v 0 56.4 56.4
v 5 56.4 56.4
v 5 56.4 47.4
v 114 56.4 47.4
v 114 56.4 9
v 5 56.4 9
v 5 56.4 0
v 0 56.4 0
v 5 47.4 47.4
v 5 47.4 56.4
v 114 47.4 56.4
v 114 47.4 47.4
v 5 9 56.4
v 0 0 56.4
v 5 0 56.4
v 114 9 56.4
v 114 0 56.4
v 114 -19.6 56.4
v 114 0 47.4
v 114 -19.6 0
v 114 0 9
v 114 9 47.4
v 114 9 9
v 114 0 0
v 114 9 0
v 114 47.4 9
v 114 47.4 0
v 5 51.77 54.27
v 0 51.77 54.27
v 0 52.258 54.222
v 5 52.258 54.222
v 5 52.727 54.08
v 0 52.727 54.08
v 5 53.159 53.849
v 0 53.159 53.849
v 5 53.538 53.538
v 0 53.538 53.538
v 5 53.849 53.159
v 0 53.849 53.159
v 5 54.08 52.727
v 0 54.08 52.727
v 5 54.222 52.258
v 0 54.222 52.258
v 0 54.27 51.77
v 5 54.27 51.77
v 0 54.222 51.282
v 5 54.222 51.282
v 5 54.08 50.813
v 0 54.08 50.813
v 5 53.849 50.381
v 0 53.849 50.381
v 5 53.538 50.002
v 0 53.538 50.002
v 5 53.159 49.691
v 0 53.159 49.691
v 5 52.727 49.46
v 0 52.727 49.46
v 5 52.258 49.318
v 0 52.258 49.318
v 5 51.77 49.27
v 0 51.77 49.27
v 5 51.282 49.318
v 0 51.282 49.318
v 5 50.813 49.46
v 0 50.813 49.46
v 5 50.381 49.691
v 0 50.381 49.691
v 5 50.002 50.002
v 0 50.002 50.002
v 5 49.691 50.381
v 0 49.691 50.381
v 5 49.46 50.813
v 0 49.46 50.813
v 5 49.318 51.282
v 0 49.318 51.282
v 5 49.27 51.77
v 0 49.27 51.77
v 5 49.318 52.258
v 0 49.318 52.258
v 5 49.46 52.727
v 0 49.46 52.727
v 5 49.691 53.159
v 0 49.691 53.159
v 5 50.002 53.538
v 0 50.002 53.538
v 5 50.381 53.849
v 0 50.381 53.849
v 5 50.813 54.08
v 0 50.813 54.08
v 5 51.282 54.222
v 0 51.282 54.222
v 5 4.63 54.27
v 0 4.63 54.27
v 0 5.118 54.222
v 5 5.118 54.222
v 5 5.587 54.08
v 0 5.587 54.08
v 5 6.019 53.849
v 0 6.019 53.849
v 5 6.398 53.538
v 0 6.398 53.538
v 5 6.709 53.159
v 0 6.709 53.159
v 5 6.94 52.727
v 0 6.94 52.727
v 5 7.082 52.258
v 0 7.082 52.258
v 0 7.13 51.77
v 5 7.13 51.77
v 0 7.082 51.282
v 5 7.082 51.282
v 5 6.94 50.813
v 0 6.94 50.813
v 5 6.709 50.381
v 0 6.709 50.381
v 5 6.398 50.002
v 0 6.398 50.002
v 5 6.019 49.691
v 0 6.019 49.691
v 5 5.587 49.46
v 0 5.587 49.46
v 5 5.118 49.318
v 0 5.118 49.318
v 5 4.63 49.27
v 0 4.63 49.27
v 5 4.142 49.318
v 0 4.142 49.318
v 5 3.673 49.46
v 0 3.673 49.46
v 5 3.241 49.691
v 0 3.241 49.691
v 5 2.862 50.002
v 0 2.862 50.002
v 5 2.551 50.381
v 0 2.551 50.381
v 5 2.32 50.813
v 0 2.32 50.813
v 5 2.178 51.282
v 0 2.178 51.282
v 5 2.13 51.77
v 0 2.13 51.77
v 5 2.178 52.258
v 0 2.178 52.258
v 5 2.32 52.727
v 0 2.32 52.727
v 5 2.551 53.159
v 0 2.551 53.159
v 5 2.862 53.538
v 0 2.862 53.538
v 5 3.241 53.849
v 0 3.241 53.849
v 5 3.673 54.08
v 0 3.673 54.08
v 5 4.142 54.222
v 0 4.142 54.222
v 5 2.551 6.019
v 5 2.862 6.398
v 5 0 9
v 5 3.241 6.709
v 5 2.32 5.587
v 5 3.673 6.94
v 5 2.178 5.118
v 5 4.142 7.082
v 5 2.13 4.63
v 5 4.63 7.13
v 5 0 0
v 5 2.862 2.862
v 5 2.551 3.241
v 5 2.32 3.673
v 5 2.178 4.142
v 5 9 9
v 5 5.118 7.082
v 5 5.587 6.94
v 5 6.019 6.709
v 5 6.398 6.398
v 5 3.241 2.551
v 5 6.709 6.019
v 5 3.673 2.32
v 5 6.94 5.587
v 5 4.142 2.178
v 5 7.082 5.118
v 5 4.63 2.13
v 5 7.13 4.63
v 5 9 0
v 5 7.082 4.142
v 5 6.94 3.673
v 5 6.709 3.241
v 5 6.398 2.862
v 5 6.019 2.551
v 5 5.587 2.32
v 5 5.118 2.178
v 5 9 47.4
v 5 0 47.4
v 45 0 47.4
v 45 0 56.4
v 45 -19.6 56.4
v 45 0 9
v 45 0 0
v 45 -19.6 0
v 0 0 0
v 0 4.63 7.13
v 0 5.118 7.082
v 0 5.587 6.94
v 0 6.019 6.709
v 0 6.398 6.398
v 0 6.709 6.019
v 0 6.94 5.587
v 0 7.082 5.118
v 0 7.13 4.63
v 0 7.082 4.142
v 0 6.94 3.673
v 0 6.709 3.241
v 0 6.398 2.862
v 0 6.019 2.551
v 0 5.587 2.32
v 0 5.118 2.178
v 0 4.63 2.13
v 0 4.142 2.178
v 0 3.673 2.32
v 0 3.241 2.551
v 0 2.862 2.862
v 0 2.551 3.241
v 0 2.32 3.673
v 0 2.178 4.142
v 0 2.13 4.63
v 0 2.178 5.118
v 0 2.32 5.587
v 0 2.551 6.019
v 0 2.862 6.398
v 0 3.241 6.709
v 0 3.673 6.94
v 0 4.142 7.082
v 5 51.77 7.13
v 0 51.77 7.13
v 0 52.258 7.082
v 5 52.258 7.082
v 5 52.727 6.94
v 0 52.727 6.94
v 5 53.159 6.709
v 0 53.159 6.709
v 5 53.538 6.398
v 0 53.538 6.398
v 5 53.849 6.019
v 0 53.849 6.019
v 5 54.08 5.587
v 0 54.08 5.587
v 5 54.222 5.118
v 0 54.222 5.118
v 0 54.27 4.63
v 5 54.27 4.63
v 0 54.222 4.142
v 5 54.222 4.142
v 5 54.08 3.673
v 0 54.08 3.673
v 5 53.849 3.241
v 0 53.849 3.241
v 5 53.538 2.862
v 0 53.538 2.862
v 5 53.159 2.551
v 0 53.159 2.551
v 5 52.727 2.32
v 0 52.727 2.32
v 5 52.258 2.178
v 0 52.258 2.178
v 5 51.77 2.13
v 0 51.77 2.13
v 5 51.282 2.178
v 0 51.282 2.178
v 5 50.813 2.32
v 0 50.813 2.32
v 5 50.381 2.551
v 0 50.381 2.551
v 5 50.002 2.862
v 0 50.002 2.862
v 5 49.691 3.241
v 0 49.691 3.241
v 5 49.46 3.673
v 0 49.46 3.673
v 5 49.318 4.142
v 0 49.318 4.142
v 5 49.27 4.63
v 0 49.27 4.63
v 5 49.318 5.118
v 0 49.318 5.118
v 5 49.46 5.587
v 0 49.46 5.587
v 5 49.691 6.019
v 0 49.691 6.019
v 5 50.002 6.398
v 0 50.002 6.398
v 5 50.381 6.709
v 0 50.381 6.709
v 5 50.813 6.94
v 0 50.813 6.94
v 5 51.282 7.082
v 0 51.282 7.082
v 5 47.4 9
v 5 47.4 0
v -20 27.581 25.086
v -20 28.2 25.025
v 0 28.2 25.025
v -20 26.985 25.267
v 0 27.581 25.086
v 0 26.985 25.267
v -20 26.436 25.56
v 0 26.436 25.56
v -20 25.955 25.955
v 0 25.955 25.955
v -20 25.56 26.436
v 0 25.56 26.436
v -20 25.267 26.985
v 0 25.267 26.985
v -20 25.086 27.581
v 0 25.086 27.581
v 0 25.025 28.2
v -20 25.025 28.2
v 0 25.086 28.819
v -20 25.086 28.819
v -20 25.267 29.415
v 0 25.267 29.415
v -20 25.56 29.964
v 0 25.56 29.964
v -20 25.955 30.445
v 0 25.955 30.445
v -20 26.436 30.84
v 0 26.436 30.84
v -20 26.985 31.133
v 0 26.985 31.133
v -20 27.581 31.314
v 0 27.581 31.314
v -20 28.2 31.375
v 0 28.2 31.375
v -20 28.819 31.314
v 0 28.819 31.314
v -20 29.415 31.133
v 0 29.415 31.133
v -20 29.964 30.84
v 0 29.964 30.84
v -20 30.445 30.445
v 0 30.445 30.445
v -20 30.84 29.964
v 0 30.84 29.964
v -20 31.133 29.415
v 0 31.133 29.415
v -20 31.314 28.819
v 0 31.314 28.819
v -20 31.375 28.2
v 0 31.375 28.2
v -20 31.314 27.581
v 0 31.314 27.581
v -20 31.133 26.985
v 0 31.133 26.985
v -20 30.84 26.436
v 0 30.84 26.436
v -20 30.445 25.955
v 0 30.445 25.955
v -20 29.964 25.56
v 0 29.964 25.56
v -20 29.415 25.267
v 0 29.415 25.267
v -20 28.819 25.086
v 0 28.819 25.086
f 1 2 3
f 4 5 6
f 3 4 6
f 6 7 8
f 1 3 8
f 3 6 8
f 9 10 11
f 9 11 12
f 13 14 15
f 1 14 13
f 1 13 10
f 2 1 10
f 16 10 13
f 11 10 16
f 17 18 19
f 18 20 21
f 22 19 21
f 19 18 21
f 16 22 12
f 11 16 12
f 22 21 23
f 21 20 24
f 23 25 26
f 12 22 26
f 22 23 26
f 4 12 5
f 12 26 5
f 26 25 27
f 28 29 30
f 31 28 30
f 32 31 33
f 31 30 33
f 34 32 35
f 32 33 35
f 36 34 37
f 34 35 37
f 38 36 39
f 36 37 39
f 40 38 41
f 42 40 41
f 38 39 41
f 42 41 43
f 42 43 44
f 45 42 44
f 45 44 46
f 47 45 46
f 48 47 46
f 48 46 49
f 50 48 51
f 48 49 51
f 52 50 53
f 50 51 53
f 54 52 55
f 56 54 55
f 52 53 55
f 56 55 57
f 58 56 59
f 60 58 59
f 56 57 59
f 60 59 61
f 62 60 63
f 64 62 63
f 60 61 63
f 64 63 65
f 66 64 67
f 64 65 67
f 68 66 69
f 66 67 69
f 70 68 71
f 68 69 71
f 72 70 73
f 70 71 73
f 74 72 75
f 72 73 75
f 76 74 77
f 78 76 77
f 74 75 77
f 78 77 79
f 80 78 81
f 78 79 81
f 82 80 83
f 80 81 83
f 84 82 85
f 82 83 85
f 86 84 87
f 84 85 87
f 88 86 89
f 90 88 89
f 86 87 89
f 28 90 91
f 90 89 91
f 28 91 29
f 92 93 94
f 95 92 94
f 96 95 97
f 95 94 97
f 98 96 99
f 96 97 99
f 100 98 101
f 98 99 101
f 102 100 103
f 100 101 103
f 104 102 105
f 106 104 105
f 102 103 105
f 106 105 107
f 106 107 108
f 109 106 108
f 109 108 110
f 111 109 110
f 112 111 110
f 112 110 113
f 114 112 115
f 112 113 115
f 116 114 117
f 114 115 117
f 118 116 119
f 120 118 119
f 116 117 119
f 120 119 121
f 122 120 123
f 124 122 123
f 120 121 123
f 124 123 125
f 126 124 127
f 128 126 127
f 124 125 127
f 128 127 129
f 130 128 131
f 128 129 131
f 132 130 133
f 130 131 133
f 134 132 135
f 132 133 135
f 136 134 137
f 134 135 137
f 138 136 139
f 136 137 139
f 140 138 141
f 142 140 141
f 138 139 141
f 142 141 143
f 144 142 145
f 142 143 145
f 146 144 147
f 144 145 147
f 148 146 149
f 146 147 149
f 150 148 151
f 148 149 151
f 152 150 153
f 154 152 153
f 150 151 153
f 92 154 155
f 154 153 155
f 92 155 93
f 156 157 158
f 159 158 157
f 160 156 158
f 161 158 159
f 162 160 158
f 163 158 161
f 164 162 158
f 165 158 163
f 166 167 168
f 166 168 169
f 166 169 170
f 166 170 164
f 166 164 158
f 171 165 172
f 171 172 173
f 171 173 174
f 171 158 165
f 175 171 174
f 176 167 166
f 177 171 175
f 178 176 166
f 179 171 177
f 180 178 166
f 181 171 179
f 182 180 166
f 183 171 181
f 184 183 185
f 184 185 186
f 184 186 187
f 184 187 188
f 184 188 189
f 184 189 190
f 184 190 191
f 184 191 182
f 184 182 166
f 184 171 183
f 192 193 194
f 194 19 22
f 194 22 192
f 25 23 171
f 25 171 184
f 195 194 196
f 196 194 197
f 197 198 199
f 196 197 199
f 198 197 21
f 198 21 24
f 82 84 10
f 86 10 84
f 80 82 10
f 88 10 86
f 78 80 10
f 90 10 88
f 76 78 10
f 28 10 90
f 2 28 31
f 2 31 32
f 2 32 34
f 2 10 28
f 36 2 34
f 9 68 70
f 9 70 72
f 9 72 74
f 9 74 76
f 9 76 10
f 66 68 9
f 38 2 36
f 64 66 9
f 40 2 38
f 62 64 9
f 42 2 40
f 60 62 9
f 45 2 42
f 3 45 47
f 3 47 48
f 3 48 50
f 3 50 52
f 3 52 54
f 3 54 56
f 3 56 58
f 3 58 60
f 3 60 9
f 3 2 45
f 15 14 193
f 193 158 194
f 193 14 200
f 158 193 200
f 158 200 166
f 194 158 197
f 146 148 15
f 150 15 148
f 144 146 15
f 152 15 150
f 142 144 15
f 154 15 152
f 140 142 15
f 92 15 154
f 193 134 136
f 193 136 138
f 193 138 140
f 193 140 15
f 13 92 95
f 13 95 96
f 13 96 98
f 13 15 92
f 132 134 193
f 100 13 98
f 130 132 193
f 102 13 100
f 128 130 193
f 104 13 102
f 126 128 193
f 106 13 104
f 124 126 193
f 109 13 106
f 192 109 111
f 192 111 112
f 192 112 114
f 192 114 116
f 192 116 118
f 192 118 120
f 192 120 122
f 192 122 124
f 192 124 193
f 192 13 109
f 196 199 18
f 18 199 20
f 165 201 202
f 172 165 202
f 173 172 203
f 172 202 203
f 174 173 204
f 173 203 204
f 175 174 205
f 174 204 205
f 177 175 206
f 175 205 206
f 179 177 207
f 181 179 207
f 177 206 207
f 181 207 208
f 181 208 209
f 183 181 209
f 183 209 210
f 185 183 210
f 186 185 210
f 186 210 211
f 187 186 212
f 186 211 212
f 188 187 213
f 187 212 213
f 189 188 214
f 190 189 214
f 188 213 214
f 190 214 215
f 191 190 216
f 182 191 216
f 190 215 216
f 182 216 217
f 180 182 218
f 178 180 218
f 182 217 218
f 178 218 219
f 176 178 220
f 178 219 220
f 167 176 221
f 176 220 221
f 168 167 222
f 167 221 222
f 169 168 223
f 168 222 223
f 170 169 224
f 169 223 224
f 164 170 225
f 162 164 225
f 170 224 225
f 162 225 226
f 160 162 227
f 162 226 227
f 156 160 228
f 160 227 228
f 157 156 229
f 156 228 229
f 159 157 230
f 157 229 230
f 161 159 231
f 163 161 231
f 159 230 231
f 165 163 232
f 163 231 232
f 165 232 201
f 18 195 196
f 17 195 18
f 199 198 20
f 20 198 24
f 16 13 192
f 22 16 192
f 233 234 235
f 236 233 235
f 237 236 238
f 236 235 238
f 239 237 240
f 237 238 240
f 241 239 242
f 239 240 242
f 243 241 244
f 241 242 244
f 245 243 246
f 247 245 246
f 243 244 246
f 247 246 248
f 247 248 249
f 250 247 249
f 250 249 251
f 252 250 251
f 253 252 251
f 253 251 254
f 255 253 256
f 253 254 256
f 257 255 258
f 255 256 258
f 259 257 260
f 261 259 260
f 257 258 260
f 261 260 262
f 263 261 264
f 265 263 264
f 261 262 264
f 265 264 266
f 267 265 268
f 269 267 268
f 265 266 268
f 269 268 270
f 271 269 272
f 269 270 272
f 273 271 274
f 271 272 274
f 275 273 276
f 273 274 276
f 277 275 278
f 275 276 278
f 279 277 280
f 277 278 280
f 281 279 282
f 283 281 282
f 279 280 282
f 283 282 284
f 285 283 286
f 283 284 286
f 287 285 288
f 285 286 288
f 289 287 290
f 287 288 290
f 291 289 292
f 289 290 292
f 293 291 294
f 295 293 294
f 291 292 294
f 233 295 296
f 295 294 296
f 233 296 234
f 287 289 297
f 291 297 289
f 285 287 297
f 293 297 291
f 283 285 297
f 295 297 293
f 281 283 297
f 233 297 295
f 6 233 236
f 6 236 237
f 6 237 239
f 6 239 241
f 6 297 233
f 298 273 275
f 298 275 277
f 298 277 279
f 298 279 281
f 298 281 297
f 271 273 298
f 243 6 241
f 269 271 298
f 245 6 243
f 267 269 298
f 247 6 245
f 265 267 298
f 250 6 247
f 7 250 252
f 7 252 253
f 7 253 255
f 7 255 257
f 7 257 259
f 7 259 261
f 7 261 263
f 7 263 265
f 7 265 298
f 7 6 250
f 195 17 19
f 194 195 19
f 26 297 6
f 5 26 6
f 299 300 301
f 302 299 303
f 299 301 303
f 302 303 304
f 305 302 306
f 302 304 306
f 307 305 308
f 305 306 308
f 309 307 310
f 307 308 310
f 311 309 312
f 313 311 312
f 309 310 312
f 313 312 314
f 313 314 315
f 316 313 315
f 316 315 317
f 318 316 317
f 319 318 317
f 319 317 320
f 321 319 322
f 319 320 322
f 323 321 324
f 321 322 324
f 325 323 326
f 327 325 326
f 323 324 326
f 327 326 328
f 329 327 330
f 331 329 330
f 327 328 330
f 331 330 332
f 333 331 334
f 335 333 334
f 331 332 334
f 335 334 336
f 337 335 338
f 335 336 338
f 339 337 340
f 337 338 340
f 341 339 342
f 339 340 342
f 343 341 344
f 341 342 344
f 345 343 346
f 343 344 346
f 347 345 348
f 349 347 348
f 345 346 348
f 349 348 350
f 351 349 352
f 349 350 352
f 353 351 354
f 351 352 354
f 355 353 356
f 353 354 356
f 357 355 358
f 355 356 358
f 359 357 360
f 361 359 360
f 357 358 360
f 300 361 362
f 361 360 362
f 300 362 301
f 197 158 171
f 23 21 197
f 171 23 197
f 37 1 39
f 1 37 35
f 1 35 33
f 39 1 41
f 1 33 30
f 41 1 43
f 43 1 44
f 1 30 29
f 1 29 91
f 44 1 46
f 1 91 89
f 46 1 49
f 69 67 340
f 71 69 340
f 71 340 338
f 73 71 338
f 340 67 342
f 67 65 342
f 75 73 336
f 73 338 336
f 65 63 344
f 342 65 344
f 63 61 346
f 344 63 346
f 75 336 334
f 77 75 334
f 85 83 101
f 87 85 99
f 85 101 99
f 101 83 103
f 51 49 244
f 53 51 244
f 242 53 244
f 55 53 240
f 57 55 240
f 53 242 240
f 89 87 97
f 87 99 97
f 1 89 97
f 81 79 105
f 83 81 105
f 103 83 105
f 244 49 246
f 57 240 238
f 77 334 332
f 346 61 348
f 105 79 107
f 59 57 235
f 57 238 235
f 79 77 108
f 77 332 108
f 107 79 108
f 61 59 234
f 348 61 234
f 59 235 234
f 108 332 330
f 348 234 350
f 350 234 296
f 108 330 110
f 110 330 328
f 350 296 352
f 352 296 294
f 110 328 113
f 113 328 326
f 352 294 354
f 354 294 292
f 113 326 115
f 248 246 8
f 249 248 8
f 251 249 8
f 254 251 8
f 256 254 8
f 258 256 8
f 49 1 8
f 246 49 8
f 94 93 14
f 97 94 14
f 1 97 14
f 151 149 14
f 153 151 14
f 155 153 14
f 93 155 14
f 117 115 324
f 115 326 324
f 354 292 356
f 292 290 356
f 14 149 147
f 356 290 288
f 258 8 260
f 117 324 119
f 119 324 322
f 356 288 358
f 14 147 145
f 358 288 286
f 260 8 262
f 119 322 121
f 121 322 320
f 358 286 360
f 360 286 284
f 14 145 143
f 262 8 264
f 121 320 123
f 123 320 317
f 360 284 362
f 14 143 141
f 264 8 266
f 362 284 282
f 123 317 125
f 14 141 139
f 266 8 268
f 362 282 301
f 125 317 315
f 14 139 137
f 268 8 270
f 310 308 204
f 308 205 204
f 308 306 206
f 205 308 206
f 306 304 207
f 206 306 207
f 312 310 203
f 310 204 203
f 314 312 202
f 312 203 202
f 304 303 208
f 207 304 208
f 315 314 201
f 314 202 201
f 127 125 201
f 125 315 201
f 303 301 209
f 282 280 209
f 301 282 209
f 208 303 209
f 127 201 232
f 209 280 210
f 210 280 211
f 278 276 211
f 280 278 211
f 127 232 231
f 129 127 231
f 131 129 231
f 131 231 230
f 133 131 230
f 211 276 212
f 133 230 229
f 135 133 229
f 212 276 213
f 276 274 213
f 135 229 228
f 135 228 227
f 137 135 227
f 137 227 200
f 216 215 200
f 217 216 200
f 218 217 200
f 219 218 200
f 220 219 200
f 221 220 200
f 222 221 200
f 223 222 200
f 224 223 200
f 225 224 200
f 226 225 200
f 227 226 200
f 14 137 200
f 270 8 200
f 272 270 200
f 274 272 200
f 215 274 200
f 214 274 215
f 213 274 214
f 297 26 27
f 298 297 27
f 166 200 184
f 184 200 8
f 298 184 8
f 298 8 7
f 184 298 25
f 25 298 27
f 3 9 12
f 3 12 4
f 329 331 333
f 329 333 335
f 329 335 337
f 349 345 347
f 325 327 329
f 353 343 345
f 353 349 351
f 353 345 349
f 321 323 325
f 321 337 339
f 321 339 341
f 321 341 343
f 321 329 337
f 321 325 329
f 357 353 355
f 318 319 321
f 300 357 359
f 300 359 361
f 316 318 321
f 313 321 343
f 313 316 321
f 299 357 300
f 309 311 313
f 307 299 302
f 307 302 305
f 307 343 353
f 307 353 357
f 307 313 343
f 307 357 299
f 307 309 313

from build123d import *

# Parameters (mm, degrees)
BOSS_EXTRUDE1_DEPTH = 56.4
SKETCH2_R           = 2.5
CUT_EXTRUDE1_DEPTH  = 5
SKETCH3_R           = 3.175
BOSS_EXTRUDE2_DEPTH = 20
SKETCH4_W           = 9
SKETCH4_H           = 9
CUT_EXTRUDE2_DEPTH  = 109


with BuildPart() as part:
    # Sketch1 → Boss-Extrude1 (new body)
    with BuildSketch(Plane.XY):
        Polygon((45, 0), (45, -19.6), (114, -19.6), (114, 0), (114, 56.4), (0, 56.4), (0, 0), align=None)
    extrude(amount=BOSS_EXTRUDE1_DEPTH)

    # Sketch2 → Cut-Extrude1 (cut)
    with BuildSketch(Plane.ZY):
        with Locations((4.63, 4.63)):
            Circle(SKETCH2_R)
        with Locations((51.77, 4.63)):
            Circle(SKETCH2_R)
        with Locations((51.77, 51.77)):
            Circle(SKETCH2_R)
        with Locations((4.63, 51.77)):
            Circle(SKETCH2_R)
    extrude(amount=-CUT_EXTRUDE1_DEPTH, mode=Mode.SUBTRACT)

    # Sketch3 → Boss-Extrude2 (add)
    with BuildSketch(Plane.ZY):
        with Locations(Location((28.2, 28.2, 0), (0, 0, 180))):
            Circle(SKETCH3_R)
    extrude(amount=BOSS_EXTRUDE2_DEPTH)

    # Sketch4 → Cut-Extrude2 (cut)
    with BuildSketch(Plane(origin=(114, 0, 0), x_dir=(0, 0, -1), z_dir=(1, 0, 0))):
        with Locations((-51.9, 51.9)):
            Rectangle(SKETCH4_W, SKETCH4_H)
        with Locations((-4.5, 51.9)):
            Rectangle(SKETCH4_W, SKETCH4_H)
        with Locations((-4.5, 4.5)):
            Rectangle(SKETCH4_W, SKETCH4_H)
        with Locations((-51.9, 4.5)):
            Rectangle(SKETCH4_W, SKETCH4_H)
    extrude(amount=-CUT_EXTRUDE2_DEPTH, mode=Mode.SUBTRACT)


solid = part.part
